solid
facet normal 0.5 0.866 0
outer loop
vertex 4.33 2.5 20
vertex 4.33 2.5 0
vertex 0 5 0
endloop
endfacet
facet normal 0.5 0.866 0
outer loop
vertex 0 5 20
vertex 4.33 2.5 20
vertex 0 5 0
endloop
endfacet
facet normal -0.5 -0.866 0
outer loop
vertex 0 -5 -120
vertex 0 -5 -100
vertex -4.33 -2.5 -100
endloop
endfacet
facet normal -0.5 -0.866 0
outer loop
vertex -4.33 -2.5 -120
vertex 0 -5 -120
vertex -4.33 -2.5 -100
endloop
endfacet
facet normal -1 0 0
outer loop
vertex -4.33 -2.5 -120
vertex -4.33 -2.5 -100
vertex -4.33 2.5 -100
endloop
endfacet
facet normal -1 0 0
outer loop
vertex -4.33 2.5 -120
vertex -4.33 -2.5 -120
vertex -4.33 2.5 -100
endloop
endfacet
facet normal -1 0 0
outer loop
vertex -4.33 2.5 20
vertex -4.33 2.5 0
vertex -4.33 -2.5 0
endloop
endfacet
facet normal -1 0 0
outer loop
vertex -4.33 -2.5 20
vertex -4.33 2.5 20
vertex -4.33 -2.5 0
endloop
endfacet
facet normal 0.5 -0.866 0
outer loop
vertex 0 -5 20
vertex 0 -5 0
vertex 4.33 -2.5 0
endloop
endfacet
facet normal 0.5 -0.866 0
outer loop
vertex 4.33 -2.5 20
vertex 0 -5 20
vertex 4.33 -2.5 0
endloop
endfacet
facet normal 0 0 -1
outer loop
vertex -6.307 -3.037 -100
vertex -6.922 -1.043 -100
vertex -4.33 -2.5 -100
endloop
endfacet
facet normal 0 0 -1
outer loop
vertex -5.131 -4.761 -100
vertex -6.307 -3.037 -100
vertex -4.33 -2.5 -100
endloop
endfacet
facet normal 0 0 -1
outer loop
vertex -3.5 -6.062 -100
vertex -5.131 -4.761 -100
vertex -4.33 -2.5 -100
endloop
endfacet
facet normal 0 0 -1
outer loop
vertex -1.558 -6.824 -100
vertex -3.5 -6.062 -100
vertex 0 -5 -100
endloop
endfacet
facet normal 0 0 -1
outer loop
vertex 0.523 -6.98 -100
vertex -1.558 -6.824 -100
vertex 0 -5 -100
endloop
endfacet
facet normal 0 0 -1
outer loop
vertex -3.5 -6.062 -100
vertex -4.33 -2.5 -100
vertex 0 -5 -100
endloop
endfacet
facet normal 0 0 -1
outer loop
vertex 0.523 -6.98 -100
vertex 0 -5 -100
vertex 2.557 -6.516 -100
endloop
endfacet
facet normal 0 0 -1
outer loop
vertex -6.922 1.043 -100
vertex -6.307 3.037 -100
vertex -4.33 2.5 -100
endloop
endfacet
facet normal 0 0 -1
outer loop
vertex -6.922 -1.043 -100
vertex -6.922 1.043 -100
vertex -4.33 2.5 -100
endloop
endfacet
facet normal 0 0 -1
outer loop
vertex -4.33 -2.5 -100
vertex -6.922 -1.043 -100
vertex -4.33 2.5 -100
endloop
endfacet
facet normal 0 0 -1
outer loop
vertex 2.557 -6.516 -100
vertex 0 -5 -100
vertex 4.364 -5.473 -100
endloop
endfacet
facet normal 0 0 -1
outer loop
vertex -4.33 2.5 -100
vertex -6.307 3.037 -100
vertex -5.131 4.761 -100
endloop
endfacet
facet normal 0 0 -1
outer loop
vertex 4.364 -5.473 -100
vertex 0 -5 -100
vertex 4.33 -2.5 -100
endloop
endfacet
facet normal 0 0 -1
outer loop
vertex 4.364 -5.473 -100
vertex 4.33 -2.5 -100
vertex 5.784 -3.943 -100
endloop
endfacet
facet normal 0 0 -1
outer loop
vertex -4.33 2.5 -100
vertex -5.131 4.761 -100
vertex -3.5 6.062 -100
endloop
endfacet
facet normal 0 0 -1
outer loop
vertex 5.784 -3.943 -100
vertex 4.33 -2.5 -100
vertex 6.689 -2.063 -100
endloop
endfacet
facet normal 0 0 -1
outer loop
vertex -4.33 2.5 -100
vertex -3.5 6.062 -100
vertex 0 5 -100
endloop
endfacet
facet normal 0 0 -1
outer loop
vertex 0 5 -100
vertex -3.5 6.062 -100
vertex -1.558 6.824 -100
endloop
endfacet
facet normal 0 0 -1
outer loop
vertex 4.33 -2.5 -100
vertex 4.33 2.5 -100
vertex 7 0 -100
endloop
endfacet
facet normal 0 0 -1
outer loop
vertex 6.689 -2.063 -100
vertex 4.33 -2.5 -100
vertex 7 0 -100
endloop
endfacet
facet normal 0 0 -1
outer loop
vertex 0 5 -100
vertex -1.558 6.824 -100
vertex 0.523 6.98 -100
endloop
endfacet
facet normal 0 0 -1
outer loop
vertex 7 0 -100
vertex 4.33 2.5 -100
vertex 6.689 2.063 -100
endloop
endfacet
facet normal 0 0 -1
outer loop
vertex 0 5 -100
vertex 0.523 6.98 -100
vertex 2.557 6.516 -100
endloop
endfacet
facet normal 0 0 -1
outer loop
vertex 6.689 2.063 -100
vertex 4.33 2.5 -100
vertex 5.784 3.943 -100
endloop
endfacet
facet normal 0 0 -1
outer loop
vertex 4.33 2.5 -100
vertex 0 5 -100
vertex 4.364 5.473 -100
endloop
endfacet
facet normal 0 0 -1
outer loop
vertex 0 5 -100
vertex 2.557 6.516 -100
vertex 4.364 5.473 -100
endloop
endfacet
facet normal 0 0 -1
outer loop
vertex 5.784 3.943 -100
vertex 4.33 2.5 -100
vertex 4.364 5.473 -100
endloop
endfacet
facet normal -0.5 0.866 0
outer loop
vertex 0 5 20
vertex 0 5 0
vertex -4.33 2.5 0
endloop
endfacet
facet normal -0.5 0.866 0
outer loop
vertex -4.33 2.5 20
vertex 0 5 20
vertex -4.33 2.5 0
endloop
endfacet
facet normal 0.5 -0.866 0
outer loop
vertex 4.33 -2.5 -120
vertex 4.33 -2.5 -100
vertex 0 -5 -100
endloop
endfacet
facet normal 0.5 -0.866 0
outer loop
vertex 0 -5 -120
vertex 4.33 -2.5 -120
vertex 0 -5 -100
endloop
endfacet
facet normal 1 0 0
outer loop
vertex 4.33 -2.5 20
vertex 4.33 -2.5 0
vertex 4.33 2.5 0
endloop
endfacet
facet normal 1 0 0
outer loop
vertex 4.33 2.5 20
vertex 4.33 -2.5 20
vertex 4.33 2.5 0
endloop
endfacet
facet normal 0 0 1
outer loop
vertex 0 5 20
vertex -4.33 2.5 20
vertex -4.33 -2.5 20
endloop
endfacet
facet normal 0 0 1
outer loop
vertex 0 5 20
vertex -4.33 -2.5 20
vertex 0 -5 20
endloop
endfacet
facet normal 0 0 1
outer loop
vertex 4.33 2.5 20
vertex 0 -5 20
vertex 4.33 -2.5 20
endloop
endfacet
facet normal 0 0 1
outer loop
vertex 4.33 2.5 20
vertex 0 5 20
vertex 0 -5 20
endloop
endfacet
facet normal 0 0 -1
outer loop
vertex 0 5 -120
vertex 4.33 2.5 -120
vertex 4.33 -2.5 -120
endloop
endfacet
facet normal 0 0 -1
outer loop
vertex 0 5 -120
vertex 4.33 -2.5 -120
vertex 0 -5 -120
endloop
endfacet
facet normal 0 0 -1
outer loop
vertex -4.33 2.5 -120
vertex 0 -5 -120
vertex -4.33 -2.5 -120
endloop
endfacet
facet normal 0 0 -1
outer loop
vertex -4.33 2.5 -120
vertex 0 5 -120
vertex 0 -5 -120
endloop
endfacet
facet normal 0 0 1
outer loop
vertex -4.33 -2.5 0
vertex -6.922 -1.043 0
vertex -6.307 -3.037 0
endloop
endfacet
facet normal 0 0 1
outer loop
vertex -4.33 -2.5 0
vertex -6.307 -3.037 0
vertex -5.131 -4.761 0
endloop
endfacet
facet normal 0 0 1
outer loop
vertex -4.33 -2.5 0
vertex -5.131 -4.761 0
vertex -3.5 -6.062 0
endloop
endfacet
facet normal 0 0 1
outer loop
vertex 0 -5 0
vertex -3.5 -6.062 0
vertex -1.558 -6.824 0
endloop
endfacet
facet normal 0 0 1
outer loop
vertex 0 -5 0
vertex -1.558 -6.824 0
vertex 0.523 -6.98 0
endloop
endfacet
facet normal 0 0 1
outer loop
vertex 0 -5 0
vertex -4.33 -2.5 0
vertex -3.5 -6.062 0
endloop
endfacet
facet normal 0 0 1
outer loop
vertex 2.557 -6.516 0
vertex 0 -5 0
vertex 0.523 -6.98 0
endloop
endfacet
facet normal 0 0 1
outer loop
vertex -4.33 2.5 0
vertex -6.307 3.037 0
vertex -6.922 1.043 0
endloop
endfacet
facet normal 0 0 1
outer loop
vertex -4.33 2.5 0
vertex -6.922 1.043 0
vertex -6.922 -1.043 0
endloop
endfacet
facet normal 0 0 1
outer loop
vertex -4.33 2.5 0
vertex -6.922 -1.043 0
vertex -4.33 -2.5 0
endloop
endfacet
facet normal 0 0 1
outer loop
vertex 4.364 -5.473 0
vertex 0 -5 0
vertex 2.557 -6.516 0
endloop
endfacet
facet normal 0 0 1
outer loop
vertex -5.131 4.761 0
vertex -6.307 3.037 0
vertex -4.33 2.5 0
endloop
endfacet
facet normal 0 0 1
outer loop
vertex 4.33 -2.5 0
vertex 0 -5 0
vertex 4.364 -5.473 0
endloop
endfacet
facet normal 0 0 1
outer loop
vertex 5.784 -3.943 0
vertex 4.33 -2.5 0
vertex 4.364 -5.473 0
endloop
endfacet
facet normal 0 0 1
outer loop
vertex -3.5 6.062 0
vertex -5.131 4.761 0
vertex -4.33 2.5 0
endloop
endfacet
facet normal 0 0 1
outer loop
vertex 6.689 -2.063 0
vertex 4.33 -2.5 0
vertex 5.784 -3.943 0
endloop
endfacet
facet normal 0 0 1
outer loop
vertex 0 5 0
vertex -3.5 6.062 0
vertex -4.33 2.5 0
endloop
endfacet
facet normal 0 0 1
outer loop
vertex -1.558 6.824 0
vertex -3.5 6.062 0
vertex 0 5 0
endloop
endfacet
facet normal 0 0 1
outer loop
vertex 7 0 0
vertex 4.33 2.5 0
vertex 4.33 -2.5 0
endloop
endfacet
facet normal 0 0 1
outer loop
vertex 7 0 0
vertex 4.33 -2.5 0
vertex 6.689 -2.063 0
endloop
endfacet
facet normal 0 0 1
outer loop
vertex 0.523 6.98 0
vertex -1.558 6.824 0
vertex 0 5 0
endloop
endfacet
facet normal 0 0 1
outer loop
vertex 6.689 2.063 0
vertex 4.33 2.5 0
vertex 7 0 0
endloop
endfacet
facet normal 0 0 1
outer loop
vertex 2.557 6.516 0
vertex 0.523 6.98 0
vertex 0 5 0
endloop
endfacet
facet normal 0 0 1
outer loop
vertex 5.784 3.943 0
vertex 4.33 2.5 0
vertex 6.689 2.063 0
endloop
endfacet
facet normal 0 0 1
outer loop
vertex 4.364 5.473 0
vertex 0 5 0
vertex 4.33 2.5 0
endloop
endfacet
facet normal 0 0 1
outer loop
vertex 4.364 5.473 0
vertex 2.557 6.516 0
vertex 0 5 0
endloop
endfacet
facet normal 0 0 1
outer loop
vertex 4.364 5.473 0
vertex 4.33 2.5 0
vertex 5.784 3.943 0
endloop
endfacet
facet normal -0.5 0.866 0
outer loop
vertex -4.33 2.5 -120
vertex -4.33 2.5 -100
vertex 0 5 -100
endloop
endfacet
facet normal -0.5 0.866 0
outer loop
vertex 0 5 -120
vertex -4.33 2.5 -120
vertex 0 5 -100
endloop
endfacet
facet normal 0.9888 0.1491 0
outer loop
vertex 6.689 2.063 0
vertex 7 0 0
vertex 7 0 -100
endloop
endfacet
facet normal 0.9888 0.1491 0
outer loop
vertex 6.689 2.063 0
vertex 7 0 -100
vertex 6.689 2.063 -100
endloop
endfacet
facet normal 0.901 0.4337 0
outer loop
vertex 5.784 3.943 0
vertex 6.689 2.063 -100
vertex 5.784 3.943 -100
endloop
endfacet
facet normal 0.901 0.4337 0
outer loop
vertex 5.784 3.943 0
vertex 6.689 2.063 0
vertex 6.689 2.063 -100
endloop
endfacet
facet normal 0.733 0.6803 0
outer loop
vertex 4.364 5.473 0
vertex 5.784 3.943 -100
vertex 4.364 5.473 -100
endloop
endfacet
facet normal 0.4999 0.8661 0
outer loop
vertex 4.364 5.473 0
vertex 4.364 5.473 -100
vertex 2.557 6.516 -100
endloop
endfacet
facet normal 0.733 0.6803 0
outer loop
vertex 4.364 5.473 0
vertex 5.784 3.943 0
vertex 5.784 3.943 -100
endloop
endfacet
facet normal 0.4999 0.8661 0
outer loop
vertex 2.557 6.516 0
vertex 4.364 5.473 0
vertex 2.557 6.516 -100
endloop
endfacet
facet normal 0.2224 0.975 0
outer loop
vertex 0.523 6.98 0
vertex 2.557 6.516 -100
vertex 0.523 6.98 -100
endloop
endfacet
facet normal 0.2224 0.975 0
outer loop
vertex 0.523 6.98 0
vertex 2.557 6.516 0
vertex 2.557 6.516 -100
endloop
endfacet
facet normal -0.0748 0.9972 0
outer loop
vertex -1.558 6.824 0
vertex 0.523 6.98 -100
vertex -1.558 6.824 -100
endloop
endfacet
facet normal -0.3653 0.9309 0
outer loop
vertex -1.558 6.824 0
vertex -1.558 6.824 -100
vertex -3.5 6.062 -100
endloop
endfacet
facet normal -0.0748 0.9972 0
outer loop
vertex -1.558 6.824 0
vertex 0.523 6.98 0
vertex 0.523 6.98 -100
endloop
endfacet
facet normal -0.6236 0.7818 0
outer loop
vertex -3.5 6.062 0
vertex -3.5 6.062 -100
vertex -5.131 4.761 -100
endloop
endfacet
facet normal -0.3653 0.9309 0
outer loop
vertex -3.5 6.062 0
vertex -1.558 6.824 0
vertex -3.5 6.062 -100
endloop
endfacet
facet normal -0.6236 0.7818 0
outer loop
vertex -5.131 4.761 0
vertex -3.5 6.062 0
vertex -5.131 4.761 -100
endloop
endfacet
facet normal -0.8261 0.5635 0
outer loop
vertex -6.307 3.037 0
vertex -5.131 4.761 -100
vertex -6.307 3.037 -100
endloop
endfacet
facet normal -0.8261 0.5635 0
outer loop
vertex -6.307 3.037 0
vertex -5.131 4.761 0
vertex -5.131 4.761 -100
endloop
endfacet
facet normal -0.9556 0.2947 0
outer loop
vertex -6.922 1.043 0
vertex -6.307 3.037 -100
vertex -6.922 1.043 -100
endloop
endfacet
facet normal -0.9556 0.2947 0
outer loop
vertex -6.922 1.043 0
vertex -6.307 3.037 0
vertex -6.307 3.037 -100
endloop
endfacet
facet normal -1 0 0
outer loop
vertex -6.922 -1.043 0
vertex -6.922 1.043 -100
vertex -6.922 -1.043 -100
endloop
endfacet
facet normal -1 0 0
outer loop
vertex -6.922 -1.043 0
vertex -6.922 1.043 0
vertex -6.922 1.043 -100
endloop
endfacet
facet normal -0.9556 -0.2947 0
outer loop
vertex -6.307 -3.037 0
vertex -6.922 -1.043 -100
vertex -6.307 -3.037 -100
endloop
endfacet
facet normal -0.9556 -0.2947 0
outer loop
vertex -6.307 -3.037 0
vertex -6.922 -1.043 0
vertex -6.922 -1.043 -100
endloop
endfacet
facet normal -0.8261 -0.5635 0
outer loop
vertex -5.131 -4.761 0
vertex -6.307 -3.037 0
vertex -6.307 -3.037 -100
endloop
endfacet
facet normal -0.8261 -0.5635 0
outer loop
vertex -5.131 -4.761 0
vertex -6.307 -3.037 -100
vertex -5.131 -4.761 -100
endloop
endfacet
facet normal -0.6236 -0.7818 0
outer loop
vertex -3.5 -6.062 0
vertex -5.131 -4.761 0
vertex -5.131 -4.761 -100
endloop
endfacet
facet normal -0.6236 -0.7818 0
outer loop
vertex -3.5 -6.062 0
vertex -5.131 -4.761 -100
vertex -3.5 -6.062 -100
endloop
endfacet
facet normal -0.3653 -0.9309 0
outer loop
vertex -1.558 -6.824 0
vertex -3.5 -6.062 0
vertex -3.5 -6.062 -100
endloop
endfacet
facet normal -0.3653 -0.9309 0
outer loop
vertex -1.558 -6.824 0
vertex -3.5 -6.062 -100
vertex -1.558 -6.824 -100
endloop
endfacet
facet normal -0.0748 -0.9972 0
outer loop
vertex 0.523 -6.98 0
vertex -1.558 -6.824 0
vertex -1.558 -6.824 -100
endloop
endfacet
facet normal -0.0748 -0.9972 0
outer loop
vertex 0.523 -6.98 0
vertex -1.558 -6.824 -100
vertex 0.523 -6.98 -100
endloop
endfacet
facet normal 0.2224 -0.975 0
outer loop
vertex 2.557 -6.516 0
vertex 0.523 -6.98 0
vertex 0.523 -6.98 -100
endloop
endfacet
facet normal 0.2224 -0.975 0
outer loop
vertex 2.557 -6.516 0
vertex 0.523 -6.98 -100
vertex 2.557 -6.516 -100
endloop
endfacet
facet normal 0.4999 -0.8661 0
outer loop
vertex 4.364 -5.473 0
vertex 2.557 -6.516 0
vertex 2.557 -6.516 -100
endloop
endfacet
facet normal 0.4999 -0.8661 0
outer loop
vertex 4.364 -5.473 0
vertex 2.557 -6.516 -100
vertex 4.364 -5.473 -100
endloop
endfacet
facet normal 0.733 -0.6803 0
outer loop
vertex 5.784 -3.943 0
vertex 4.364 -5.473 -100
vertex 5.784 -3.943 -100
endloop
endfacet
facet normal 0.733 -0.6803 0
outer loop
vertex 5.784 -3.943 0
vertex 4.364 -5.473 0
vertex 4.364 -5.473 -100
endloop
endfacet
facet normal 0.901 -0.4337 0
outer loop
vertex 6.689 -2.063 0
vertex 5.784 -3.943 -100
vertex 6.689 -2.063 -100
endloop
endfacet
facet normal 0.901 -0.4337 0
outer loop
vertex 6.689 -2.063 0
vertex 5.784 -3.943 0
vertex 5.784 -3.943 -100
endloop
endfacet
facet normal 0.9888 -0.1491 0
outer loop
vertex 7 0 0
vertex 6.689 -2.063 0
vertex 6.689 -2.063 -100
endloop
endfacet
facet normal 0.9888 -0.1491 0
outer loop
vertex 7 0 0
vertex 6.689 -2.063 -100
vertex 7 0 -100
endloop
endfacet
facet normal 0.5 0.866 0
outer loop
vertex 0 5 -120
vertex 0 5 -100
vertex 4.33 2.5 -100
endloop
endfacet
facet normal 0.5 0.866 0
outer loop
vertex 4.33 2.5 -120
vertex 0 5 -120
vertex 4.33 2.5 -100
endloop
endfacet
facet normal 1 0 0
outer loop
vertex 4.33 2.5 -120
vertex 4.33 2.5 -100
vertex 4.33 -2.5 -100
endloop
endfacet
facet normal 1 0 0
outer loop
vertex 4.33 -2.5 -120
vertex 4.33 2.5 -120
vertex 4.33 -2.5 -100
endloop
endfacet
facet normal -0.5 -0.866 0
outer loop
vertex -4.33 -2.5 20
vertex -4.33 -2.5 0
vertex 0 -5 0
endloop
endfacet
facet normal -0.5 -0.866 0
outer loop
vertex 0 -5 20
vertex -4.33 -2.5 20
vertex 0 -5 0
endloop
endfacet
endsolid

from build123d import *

# Parameters (mm, degrees)
SKETCH1_R           = 7
BOSS_EXTRUDE1_DEPTH = 100
BOSS_EXTRUDE2_DEPTH = 20
BOSS_EXTRUDE3_DEPTH = 20


with BuildPart() as part:
    # Sketch1 → Boss-Extrude1 (new body)
    with BuildSketch(Plane.XY):
        Circle(SKETCH1_R)
    extrude(amount=-BOSS_EXTRUDE1_DEPTH)

    # Sketch2 → Boss-Extrude2 (add)
    with BuildSketch(Plane.XY):
        Polygon((0, 5), (-4.330127019, 2.5), (-4.330127019, -2.5), (0, -5), (4.330127019, -2.5), (4.330127019, 2.5), align=None)
    extrude(amount=BOSS_EXTRUDE2_DEPTH)

    # Sketch3 → Boss-Extrude3 (add)
    with BuildSketch(Plane(origin=(0, 0, -100), x_dir=(-1, 0, 0), z_dir=(0, 0, -1))):
        Polygon((0, 5), (-4.330127019, 2.5), (-4.330127019, -2.5), (0, -5), (4.330127019, -2.5), (4.330127019, 2.5), align=None)
    extrude(amount=BOSS_EXTRUDE3_DEPTH)


solid = part.part
